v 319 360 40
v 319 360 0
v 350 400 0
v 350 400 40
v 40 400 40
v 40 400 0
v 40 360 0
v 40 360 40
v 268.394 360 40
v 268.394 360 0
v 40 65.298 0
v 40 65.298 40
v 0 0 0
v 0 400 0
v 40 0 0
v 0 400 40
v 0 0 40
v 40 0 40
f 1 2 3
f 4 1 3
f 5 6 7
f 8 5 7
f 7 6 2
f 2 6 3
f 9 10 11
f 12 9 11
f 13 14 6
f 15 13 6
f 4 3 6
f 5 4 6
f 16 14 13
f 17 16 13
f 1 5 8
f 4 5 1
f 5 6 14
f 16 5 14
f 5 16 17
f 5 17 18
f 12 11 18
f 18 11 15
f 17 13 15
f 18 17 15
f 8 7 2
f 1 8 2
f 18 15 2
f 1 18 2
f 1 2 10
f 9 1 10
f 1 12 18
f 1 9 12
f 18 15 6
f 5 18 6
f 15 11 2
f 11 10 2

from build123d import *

# Parameters (mm, degrees)
F1_DEPTH = 40
F2_DEPTH = 40
F3_DEPTH = 40


with BuildPart() as f1:
    # F0 (on Top) → F1 (new body)
    with BuildSketch(Plane.XY):
        Polygon((350, 400), (40, 400), (40, 360), (268.393676, 360), (319, 360), align=None)
    extrude(amount=F1_DEPTH)


with BuildPart() as f2:
    # F0 (on Top) → F2 (new body)
    with BuildSketch(Plane.XY):
        Polygon((40, 65.298482), (40, 0), (319, 360), (268.393676, 360), align=None)
    extrude(amount=F2_DEPTH)


with BuildPart() as f3:
    # F0 (on Top) → F3 (new body)
    with BuildSketch(Plane.XY):
        Polygon((0, 400), (0, 0), (40, 0), (40, 65.298482), (40, 360), (40, 400), align=None)
    extrude(amount=F3_DEPTH)


solid = Compound([f1.part, f2.part, f3.part])
